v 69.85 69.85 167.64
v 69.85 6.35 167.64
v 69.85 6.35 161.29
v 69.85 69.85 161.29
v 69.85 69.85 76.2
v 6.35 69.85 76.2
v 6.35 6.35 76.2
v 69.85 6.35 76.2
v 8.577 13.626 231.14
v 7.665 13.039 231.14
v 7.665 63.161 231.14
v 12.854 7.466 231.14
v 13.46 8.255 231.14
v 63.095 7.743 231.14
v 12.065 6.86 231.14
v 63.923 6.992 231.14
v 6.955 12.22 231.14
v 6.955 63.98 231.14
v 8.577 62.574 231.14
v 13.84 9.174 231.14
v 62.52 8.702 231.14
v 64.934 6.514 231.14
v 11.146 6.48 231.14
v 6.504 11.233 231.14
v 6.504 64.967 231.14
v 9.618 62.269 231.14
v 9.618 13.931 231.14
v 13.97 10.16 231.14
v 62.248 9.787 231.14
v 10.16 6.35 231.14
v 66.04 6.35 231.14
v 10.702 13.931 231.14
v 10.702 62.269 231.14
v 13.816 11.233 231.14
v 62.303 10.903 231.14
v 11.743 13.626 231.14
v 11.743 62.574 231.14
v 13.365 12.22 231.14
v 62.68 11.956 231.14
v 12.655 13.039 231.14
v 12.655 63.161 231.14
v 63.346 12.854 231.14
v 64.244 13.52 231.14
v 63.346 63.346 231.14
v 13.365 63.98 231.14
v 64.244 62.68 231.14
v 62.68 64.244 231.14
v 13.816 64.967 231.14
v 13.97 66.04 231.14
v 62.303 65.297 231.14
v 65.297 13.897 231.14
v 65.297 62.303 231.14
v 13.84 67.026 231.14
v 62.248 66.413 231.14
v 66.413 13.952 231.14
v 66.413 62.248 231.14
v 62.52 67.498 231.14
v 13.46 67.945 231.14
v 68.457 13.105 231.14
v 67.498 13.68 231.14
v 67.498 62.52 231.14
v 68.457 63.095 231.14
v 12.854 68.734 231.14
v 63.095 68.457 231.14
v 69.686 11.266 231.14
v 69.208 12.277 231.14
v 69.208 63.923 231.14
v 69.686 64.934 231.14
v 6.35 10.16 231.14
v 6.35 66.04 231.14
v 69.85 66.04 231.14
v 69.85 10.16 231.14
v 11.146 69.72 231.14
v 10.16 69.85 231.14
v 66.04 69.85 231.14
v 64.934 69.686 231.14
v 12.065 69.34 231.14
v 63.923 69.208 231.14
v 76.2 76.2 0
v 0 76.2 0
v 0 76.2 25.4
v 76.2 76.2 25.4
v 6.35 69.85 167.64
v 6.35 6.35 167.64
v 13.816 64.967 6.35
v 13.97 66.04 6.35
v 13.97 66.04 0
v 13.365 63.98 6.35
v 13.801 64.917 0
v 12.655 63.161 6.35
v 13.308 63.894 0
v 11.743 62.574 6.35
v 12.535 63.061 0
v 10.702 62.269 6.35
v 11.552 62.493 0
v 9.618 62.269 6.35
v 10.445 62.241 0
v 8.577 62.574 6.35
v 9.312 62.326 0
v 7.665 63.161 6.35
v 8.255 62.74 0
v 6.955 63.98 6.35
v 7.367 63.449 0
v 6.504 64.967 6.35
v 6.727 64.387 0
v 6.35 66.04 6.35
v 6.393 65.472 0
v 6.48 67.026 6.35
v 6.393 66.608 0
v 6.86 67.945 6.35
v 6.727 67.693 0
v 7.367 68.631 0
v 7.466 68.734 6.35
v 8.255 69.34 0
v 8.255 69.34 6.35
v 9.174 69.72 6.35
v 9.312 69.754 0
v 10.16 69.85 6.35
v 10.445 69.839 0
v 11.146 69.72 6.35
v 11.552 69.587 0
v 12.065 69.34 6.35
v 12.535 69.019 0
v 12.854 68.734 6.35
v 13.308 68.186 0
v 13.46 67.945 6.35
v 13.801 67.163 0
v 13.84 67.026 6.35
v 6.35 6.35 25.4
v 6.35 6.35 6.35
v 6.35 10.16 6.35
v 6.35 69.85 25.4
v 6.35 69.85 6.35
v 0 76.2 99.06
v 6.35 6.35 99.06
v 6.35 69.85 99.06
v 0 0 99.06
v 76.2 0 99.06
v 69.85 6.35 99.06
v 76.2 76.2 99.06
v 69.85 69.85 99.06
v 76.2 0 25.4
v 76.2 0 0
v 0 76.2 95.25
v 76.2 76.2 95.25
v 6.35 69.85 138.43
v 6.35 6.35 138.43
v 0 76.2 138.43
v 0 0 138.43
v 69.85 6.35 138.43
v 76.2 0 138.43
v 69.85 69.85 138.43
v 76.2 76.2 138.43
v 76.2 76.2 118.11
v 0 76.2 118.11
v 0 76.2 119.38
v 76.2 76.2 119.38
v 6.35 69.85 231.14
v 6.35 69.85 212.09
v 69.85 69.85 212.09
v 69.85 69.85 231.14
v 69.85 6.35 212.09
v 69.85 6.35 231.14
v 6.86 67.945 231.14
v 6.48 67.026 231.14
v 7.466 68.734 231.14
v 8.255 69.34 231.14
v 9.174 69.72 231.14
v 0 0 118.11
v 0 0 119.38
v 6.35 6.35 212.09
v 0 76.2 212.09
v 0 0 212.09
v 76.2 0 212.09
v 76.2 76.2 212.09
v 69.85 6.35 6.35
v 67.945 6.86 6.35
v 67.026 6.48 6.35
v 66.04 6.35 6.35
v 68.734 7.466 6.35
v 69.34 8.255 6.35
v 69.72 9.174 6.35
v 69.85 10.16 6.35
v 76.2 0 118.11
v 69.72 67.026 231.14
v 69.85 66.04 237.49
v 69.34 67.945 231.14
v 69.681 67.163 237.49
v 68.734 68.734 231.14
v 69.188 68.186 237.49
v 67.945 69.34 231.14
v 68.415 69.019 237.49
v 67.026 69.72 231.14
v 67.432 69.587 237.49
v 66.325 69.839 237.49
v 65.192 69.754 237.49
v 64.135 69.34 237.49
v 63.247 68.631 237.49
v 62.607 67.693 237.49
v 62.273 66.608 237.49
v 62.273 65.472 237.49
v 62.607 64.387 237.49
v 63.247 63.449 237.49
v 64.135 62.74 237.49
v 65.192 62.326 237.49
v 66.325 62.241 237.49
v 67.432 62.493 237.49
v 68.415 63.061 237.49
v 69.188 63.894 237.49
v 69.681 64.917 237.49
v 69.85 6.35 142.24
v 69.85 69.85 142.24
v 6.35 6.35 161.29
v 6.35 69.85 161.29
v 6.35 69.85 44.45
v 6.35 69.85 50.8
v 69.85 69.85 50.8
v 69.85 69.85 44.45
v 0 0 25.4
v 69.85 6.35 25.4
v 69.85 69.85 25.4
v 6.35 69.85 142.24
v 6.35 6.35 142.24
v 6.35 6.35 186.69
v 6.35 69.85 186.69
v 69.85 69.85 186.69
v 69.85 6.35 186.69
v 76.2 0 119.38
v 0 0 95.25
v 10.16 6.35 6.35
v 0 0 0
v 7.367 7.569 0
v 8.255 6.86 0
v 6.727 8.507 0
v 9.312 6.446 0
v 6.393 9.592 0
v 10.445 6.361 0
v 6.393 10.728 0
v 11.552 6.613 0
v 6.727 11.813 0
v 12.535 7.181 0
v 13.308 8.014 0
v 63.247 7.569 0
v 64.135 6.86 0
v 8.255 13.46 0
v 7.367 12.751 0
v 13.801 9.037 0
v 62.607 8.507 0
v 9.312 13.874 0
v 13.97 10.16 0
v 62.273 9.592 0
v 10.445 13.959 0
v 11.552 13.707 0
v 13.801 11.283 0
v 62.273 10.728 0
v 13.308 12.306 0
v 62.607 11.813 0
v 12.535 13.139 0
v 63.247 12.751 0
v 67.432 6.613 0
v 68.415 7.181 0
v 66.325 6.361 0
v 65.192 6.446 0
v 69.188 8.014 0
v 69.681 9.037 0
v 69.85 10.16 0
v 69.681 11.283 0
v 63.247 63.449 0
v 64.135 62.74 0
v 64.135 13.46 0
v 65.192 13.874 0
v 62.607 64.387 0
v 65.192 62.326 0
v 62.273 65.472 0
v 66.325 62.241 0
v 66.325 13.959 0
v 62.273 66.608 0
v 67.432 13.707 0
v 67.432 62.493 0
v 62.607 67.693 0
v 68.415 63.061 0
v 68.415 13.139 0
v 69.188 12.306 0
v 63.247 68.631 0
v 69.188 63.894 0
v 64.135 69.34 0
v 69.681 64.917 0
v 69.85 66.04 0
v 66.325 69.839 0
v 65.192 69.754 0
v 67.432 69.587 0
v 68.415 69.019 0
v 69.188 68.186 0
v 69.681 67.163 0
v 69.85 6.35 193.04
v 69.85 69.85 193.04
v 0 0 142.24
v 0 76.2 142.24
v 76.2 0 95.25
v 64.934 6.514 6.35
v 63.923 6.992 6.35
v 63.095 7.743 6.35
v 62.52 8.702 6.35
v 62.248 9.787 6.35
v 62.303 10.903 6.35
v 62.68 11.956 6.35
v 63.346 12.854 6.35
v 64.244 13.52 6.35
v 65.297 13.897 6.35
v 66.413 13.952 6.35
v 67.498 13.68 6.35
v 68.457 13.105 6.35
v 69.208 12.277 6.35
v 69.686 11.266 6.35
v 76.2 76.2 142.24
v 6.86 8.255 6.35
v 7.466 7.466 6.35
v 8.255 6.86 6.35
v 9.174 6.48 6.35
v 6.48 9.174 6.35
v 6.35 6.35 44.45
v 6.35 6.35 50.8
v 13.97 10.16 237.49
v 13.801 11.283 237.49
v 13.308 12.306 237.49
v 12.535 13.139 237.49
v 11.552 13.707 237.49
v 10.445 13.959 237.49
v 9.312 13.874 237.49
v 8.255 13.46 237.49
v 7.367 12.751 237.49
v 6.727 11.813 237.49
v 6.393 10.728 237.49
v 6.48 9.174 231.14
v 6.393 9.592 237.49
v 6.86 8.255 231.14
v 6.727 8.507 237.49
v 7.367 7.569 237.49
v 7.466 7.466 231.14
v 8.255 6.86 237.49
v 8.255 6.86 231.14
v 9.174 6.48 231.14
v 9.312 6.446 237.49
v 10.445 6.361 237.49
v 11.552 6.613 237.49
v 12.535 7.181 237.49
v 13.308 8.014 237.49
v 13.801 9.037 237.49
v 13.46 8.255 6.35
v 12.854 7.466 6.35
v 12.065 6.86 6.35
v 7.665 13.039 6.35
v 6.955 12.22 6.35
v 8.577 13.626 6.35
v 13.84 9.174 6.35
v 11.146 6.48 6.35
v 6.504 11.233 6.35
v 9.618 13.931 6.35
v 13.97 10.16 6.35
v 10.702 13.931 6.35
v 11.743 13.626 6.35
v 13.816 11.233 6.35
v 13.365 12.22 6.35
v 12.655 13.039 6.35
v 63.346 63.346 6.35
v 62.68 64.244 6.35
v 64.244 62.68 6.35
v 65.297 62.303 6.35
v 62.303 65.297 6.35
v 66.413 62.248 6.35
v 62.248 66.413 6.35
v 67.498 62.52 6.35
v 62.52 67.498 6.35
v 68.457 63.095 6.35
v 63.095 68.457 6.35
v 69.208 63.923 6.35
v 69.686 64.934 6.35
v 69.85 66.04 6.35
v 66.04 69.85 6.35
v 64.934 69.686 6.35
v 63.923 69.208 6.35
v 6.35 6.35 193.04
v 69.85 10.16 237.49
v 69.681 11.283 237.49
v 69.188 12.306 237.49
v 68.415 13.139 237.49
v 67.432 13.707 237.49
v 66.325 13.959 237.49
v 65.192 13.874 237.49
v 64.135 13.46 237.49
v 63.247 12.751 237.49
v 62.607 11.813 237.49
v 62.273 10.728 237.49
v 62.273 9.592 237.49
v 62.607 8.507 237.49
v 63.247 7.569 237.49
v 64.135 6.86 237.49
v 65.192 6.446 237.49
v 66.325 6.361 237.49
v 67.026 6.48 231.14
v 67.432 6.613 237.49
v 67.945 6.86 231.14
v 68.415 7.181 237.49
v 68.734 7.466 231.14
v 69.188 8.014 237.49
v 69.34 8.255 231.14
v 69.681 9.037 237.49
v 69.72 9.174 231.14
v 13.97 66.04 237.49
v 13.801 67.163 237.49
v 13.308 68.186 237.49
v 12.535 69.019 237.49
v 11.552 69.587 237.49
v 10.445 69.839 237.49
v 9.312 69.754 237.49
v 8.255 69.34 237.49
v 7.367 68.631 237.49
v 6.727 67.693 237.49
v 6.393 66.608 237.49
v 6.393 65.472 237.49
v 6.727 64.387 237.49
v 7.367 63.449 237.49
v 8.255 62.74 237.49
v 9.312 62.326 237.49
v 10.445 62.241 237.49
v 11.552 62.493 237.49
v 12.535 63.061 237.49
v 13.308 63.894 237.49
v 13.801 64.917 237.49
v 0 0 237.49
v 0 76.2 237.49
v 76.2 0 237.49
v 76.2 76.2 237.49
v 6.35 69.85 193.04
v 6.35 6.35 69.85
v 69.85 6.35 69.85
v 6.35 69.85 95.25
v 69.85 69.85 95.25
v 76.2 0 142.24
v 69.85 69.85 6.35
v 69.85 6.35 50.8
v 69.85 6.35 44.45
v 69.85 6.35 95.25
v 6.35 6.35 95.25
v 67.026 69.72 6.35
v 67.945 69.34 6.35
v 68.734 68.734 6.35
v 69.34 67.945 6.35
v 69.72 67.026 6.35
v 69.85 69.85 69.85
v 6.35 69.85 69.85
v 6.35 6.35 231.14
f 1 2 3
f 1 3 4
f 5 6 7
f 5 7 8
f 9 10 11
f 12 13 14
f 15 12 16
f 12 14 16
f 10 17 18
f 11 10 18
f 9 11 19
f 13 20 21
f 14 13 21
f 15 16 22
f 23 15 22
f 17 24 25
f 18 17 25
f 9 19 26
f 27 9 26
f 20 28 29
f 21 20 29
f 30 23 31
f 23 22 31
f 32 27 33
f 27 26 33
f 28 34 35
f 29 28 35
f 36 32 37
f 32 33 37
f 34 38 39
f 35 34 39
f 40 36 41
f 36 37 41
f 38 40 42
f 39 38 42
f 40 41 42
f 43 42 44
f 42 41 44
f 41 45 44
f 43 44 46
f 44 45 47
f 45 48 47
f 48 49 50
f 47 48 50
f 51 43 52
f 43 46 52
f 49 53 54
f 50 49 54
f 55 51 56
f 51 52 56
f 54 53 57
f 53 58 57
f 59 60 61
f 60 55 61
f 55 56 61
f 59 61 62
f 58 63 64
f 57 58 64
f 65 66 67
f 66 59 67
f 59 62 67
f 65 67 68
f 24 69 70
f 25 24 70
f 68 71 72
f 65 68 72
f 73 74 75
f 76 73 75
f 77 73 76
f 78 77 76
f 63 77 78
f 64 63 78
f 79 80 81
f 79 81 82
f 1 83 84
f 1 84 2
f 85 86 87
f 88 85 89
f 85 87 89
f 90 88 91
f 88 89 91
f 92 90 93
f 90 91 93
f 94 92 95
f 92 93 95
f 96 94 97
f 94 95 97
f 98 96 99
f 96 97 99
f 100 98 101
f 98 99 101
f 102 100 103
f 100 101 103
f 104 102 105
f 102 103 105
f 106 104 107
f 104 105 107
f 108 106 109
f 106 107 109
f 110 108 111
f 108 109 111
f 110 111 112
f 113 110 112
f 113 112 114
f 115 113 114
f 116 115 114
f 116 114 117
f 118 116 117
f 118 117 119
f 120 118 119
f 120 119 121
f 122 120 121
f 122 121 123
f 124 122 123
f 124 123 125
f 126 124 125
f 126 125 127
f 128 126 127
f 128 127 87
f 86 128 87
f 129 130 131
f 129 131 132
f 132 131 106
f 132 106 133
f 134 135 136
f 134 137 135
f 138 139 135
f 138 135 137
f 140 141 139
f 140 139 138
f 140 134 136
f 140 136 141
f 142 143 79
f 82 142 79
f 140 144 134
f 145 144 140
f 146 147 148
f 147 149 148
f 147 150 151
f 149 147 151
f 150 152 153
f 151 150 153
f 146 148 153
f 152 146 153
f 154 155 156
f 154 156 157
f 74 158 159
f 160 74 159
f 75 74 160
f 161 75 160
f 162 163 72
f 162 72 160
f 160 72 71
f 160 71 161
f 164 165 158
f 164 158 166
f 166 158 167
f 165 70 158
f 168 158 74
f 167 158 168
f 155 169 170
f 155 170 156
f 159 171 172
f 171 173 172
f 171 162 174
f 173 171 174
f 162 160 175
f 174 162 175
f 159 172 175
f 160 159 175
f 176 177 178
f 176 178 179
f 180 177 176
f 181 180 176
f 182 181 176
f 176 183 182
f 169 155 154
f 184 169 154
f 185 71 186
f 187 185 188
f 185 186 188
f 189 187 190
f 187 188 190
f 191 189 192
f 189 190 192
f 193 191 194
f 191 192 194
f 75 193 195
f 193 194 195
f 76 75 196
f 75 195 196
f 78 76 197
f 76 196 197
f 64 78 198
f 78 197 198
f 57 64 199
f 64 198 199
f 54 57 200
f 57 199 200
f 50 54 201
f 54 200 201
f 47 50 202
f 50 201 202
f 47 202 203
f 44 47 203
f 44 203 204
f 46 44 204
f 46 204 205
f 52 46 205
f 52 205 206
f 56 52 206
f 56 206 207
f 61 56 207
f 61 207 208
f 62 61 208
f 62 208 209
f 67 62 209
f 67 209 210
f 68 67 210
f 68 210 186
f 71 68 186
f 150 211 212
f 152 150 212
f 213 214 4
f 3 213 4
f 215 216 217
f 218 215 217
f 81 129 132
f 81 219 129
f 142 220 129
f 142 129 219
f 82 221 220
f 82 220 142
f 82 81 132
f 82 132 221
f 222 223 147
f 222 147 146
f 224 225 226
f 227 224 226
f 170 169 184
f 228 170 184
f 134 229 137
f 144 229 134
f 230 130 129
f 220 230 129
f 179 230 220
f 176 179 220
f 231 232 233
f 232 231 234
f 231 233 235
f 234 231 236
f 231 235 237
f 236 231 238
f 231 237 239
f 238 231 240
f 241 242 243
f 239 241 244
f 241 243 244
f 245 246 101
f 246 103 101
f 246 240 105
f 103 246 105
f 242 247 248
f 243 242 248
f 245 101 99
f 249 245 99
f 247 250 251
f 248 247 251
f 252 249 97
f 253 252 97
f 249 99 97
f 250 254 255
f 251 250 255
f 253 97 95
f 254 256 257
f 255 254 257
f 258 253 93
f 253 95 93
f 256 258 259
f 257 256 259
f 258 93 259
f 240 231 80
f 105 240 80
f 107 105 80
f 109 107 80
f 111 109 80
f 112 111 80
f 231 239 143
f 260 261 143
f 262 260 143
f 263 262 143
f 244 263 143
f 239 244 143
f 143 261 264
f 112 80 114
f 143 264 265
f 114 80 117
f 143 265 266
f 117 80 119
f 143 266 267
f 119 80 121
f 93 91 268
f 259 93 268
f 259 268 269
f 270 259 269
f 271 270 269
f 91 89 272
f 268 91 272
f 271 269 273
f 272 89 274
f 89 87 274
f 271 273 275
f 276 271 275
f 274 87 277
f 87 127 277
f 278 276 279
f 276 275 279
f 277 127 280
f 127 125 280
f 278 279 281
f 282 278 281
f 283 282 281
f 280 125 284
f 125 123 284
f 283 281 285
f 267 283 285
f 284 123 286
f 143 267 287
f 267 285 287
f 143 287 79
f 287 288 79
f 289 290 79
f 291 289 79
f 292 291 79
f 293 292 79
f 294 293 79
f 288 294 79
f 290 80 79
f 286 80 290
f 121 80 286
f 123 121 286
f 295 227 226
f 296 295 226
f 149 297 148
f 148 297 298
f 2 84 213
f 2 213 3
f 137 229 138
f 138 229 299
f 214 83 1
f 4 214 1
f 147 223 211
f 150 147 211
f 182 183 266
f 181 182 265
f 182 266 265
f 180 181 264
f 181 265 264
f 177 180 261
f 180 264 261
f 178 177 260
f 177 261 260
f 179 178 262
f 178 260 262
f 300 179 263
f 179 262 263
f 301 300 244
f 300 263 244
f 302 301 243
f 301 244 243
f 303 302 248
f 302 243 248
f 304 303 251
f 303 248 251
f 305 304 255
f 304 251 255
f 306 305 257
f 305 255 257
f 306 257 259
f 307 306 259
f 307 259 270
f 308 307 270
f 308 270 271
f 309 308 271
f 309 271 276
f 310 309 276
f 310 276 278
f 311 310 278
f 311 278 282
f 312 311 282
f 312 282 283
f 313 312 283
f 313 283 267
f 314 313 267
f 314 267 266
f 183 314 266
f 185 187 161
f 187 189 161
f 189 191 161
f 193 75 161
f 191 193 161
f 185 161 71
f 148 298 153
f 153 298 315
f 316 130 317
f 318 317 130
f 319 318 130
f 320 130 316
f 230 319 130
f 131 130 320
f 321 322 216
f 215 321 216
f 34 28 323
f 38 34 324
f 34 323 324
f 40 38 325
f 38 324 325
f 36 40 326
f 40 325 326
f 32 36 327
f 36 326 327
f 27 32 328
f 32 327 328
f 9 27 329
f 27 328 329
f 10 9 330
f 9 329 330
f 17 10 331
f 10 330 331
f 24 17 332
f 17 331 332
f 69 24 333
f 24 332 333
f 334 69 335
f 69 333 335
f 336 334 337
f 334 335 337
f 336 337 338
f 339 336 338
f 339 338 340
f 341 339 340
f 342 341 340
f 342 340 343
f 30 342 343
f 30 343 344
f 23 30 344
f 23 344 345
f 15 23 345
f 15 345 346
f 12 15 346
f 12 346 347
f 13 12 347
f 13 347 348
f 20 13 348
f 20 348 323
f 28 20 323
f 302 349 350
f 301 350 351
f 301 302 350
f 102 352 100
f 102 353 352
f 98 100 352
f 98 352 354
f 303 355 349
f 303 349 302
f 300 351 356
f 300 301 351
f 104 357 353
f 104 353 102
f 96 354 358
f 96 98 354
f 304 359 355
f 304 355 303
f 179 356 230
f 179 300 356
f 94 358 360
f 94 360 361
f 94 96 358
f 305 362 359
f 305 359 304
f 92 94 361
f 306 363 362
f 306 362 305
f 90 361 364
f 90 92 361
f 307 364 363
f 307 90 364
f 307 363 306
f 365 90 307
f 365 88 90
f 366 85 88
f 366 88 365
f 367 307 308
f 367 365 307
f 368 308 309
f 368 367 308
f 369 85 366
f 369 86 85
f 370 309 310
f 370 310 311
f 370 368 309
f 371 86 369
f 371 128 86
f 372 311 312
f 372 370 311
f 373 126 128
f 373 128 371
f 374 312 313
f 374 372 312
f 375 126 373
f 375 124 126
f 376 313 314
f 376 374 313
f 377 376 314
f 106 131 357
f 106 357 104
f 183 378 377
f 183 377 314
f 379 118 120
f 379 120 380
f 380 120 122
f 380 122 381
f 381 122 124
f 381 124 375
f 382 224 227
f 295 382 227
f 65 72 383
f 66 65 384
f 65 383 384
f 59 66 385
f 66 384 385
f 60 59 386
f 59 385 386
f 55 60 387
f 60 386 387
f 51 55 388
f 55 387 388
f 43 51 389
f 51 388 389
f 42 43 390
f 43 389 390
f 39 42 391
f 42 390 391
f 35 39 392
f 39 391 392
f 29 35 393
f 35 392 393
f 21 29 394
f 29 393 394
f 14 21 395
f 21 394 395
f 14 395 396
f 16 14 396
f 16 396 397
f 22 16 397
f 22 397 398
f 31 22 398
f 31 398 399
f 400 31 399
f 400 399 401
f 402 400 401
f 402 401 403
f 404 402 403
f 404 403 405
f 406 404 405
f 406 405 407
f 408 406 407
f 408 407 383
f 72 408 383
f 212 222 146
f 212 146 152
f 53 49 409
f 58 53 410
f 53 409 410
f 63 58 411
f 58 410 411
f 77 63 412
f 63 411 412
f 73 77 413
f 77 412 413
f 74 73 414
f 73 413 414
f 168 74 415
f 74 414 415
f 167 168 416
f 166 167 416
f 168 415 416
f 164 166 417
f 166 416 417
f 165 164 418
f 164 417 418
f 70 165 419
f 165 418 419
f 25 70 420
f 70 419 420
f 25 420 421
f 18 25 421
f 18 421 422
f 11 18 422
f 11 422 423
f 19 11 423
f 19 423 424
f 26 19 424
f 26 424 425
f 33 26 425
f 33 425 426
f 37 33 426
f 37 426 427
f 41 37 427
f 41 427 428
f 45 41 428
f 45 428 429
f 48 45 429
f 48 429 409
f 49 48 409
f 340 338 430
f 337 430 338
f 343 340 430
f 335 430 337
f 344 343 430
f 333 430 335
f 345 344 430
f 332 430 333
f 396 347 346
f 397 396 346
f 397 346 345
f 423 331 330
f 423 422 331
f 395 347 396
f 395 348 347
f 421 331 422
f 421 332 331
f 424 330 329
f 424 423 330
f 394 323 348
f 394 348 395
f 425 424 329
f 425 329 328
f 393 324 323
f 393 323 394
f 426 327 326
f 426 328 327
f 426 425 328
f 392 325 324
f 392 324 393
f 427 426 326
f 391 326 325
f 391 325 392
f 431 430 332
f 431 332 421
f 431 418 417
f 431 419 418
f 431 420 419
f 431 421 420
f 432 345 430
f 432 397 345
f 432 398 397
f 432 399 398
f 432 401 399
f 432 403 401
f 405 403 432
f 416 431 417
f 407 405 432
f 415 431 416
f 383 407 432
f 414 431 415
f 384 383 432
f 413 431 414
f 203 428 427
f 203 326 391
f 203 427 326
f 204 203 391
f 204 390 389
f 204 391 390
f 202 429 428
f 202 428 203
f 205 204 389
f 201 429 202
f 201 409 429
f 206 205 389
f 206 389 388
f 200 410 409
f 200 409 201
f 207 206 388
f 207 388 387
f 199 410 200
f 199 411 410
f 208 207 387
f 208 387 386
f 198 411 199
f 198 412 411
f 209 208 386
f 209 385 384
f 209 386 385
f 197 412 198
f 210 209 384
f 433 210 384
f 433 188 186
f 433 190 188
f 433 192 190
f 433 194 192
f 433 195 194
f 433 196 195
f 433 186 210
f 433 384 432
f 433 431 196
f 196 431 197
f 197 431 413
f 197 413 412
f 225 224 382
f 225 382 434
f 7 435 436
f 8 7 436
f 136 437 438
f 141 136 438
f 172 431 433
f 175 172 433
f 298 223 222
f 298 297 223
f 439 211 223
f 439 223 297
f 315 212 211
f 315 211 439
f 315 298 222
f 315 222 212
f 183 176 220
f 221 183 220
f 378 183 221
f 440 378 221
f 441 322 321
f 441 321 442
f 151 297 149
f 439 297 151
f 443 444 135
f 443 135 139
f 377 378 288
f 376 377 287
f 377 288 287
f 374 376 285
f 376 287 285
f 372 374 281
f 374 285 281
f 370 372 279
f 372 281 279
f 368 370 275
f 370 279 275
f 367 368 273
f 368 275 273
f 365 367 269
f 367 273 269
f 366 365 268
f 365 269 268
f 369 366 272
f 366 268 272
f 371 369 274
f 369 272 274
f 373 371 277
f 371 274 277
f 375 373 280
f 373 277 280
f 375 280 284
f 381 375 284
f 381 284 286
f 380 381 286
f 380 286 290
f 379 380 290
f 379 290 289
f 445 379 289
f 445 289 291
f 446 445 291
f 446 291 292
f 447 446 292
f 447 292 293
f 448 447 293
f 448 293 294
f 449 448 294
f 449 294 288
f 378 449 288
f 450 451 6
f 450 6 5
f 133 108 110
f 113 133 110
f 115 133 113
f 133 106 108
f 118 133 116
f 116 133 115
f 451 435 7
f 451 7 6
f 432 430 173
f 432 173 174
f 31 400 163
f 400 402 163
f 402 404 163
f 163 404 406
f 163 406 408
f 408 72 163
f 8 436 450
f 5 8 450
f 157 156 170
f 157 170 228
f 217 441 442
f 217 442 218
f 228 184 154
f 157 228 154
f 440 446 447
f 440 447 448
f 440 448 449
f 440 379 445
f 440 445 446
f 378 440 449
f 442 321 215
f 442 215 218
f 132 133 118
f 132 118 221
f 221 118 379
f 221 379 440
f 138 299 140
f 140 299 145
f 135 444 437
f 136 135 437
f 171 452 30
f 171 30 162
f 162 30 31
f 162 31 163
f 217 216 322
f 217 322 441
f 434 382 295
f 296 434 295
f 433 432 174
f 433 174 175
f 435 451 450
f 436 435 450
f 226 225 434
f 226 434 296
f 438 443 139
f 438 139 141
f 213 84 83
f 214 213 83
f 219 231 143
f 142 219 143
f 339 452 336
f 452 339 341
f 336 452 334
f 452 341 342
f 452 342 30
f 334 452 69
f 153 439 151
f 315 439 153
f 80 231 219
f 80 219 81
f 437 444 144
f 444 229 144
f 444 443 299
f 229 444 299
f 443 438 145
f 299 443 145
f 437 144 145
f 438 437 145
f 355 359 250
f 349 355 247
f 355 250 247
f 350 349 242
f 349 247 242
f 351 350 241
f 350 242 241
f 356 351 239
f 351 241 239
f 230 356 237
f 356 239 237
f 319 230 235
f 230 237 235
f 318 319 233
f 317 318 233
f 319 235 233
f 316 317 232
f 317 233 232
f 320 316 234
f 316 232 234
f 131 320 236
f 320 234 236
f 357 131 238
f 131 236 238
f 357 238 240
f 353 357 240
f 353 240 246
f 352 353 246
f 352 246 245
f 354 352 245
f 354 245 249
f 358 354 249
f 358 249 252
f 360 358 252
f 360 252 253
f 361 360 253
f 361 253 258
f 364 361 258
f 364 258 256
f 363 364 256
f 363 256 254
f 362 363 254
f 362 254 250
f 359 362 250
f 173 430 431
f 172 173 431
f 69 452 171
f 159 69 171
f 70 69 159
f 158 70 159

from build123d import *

# Parameters (mm, degrees)
F0_W      = 76.2
F0_H      = 76.2
F0_W_2    = 63.5
F0_H_2    = 63.5
F1_DEPTH  = 25.4
F2_DEPTH  = 6.35
F3_W      = 76.2
F3_H      = 76.2
F4_DEPTH  = 25.4
F5_DEPTH  = 19.05
F6_W      = 76.2
F6_H      = 76.2
F6_W_2    = 63.5
F6_H_2    = 63.5
F7_DEPTH  = 25.4
F8_W      = 63.5
F8_H      = 63.5
F9_DEPTH  = 25.4
F10_DEPTH = 19.05
F11_W     = 76.2
F11_H     = 76.2
F11_W_2   = 63.5
F11_H_2   = 63.5
F12_DEPTH = 22.86
F13_DEPTH = 19.05
F14_W     = 76.2
F14_H     = 76.2
F15_DEPTH = 20.32
F16_DEPTH = 19.05
F19_R     = 3.81
F20_DEPTH = 25.4
F21_R     = 3.81
F22_DEPTH = 25.4


with BuildPart() as f1:
    # F0 (on Top) → F1 (new body)
    with BuildSketch(Plane.XY):
        with Locations((38.1, 38.1)):
            Rectangle(F0_W, F0_H)
        with Locations((38.1, 38.1)):
            Rectangle(F0_W_2, F0_H_2, mode=Mode.SUBTRACT)
    extrude(amount=F1_DEPTH)

    # F0 (on Top) → F2 (join)
    with BuildSketch(Plane.XY):
        with Locations((38.1, 38.1)):
            Rectangle(F0_W_2, F0_H_2)
    extrude(amount=F2_DEPTH)


with BuildPart() as f4:
    # F3 (on face) → F4 (new body)
    with BuildSketch(Plane.XY.offset(25.4)):
        with Locations((38.1, 38.1)):
            Rectangle(F3_W, F3_H)
    extrude(amount=F4_DEPTH)

    # F3 (on face) → F5 (cut)
    with BuildSketch(Plane.XY.offset(25.4)):
        with Locations((38.1, 38.1)):
            Rectangle(F3_W, F3_H)
    extrude(amount=F5_DEPTH, mode=Mode.SUBTRACT)

    # F6 (on face) → F7 (cut)
    with BuildSketch(Plane.XY.offset(50.8)):
        with Locations((38.1, 38.1)):
            Rectangle(F6_W, F6_H)
        with Locations((38.1, 38.1)):
            Rectangle(F6_W_2, F6_H_2, mode=Mode.SUBTRACT)
    extrude(amount=-F7_DEPTH, mode=Mode.SUBTRACT)


with BuildPart() as f9:
    # F8 (on face) → F9 (new body)
    with BuildSketch(Plane.XY.offset(50.8)):
        with Locations((38.1, 38.1)):
            Rectangle(F8_W, F8_H)
    extrude(amount=F9_DEPTH)

    # F8 (on face) → F10 (cut)
    with BuildSketch(Plane.XY.offset(50.8)):
        with Locations((38.1, 38.1)):
            Rectangle(F8_W, F8_H)
    extrude(amount=F10_DEPTH, mode=Mode.SUBTRACT)


with BuildPart() as f12:
    # F11 (on face) → F12 (new body)
    with BuildSketch(Plane.XY.offset(76.2)):
        with Locations((38.1, 38.1)):
            Rectangle(F11_W, F11_H)
        with Locations((38.1, 38.1)):
            Rectangle(F11_W_2, F11_H_2, mode=Mode.SUBTRACT)
    extrude(amount=F12_DEPTH)

    # F11 (on face) → F13 (cut)
    with BuildSketch(Plane.XY.offset(76.2)):
        with Locations((38.1, 38.1)):
            Rectangle(F11_W, F11_H)
        with Locations((38.1, 38.1)):
            Rectangle(F11_W_2, F11_H_2, mode=Mode.SUBTRACT)
    extrude(amount=F13_DEPTH, mode=Mode.SUBTRACT)


with BuildPart() as f15:
    # F14 (on face) → F15 (new body)
    with BuildSketch(Plane.XY.offset(99.06)):
        with Locations((38.1, 38.1)):
            Rectangle(F14_W, F14_H)
    extrude(amount=F15_DEPTH)

    # F14 (on face) → F16 (cut)
    with BuildSketch(Plane.XY.offset(99.06)):
        with Locations((38.1, 38.1)):
            Rectangle(F14_W, F14_H)
    extrude(amount=F16_DEPTH, mode=Mode.SUBTRACT)

    # F18: F15, F12, F9, F4, F1 across plane


with BuildPart() as f15_1:
    add(f15.part)
    add(f15.part.mirror(Plane(origin=(38.1, 38.1, 118.745), x_dir=(1, 0, 0), z_dir=(0, 0, -1))))
    add(f12.part.mirror(Plane(origin=(38.1, 38.1, 118.745), x_dir=(1, 0, 0), z_dir=(0, 0, -1))))
    add(f9.part.mirror(Plane(origin=(38.1, 38.1, 118.745), x_dir=(1, 0, 0), z_dir=(0, 0, -1))))
    add(f4.part.mirror(Plane(origin=(38.1, 38.1, 118.745), x_dir=(1, 0, 0), z_dir=(0, 0, -1))))
    add(f1.part.mirror(Plane(origin=(38.1, 38.1, 118.745), x_dir=(1, 0, 0), z_dir=(0, 0, -1))))

    # F19 (on face) → F20 (cut)
    with BuildSketch(Plane.XY.offset(237.49)):
        with Locations((10.16, 10.16)):
            Circle(F19_R)
        with Locations((10.16, 66.04)):
            Circle(F19_R)
        with Locations((66.04, 66.04)):
            Circle(F19_R)
        with Locations((66.04, 10.16)):
            Circle(F19_R)
    extrude(amount=-F20_DEPTH, mode=Mode.SUBTRACT)


with BuildPart() as f1_1:
    add(f1.part)

    # F21 (on face) → F22 (cut)
    with BuildSketch(Plane(origin=(0, 0, 0), x_dir=(1, 0, 0), z_dir=(0, 0, -1))):
        with Locations((66.04, -66.04)):
            Circle(F21_R)
        with Locations((10.16, -66.04)):
            Circle(F21_R)
        with Locations((66.04, -10.16)):
            Circle(F21_R)
        with Locations((10.16, -10.16)):
            Circle(F21_R)
    extrude(amount=-F22_DEPTH, mode=Mode.SUBTRACT)


solid = Compound([f4.part, f9.part, f12.part, f15_1.part, f1_1.part])
